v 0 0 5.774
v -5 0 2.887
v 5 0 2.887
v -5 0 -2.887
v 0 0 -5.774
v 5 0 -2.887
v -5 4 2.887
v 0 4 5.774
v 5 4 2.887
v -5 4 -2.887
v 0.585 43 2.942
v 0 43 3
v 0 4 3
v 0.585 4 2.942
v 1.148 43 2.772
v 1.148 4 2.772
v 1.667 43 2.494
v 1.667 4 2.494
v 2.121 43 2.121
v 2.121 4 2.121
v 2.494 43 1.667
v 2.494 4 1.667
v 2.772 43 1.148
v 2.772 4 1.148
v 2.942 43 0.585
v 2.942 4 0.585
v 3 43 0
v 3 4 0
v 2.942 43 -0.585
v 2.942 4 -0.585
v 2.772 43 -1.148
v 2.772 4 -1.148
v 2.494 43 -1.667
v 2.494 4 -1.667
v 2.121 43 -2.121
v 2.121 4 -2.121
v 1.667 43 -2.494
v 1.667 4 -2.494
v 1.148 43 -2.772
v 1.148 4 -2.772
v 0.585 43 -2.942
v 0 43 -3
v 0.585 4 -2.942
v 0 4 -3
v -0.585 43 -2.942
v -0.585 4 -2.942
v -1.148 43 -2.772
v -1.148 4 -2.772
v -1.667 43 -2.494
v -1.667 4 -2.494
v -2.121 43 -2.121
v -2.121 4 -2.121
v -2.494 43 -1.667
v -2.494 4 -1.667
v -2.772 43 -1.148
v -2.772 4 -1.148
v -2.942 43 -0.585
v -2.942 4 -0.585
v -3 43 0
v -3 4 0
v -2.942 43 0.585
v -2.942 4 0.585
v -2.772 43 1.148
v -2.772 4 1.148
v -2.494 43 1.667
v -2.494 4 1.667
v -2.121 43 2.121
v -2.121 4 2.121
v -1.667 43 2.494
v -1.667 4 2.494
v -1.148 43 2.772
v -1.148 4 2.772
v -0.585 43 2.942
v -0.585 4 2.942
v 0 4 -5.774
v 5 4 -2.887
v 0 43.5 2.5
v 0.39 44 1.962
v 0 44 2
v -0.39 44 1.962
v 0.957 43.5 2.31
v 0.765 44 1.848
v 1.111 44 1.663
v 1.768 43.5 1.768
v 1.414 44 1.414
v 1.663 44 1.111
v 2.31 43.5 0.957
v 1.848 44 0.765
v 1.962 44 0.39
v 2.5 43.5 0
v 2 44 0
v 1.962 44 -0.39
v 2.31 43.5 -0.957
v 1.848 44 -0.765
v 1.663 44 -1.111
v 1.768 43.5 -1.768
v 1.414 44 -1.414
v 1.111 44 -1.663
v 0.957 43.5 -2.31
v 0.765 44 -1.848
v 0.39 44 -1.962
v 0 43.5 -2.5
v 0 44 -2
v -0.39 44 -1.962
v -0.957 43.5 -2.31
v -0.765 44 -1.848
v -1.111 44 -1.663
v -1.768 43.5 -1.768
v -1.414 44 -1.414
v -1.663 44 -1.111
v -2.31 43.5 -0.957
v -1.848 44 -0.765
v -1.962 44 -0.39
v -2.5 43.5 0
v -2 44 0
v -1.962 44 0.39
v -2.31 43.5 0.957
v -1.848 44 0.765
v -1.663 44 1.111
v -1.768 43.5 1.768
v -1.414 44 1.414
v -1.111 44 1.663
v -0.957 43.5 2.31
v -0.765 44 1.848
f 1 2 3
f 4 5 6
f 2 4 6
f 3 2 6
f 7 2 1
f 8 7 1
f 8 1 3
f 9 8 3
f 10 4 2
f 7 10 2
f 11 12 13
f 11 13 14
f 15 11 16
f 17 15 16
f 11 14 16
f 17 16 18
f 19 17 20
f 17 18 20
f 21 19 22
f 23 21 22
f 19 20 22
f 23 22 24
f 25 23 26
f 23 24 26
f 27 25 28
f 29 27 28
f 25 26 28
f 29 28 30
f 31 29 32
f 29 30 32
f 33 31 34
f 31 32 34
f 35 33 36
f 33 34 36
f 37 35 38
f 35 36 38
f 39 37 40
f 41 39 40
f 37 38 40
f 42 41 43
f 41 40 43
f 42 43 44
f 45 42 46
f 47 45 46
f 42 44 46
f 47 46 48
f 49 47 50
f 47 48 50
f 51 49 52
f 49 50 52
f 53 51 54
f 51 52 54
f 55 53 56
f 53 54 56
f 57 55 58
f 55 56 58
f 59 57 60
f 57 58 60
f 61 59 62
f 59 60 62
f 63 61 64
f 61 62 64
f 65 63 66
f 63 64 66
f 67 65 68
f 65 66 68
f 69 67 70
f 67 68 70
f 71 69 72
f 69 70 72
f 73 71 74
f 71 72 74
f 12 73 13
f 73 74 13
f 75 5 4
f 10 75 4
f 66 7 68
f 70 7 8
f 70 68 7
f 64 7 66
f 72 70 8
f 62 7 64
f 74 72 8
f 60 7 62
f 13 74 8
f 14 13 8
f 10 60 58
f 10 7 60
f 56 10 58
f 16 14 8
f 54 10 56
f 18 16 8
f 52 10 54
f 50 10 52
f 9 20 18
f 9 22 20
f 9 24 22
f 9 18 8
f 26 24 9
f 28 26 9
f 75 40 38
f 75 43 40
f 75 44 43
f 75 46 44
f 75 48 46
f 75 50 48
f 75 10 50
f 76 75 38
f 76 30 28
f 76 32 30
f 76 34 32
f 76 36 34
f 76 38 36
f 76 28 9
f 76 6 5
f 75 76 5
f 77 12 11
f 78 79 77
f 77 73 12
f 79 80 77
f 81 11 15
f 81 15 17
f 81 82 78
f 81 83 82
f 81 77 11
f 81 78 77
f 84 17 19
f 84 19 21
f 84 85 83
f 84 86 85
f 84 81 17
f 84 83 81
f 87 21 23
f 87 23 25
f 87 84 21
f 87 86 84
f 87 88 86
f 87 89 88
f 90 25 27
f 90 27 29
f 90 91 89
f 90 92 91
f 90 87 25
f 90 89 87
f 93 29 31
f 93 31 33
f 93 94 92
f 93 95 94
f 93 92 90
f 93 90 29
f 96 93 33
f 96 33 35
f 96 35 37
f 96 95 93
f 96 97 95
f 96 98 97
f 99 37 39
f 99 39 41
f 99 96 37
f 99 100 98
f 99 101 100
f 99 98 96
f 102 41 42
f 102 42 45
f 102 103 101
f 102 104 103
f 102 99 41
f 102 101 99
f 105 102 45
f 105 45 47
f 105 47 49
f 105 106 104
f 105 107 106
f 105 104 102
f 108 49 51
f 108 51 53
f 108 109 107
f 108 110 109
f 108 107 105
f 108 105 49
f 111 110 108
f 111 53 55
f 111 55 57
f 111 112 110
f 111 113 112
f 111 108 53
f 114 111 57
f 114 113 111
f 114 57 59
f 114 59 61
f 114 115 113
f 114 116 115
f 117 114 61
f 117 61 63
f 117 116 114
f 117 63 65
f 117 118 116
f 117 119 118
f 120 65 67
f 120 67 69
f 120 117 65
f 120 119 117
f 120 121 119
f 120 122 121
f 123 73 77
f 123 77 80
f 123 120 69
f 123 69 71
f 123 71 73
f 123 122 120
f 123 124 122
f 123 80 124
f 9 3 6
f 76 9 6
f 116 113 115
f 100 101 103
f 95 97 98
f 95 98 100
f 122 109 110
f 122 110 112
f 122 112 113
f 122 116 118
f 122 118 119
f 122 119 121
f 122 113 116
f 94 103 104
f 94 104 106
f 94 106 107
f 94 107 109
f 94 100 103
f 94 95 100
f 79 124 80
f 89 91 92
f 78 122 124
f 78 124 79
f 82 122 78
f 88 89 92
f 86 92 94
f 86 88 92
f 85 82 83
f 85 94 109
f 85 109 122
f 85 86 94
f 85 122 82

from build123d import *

# Parameters (mm, degrees)
BOSS_EXTRUDE1_DEPTH = 4
SKETCH2_R           = 3
BOSS_EXTRUDE2_DEPTH = 40
CHAMFER1_SIZE       = 1


with BuildPart() as part:
    # Sketch1 → Boss-Extrude1 (new body)
    with BuildSketch(Plane(origin=(0, 0, 0), x_dir=(1, 0, 0), z_dir=(0, 1, 0))):
        Polygon((0, 5.773502692), (-5, 2.886751346), (-5, -2.886751346), (0, -5.773502692), (5, -2.886751346), (5, 2.886751346), align=None)
    extrude(amount=BOSS_EXTRUDE1_DEPTH)

    # Sketch2 → Boss-Extrude2 (add)
    with BuildSketch(Plane(origin=(0, 4, 0), x_dir=(1, 0, 0), z_dir=(0, 1, 0))):
        with Locations(Location((0, 0, 0), (0, 0, 270))):
            Circle(SKETCH2_R)
    extrude(amount=BOSS_EXTRUDE2_DEPTH)

    # Chamfer1
    chamfer1_edges = [part.edges().sort_by_distance(p)[0] for p in [
        (0, 44, -3),
    ]]
    chamfer(chamfer1_edges, length=CHAMFER1_SIZE)


solid = part.part
